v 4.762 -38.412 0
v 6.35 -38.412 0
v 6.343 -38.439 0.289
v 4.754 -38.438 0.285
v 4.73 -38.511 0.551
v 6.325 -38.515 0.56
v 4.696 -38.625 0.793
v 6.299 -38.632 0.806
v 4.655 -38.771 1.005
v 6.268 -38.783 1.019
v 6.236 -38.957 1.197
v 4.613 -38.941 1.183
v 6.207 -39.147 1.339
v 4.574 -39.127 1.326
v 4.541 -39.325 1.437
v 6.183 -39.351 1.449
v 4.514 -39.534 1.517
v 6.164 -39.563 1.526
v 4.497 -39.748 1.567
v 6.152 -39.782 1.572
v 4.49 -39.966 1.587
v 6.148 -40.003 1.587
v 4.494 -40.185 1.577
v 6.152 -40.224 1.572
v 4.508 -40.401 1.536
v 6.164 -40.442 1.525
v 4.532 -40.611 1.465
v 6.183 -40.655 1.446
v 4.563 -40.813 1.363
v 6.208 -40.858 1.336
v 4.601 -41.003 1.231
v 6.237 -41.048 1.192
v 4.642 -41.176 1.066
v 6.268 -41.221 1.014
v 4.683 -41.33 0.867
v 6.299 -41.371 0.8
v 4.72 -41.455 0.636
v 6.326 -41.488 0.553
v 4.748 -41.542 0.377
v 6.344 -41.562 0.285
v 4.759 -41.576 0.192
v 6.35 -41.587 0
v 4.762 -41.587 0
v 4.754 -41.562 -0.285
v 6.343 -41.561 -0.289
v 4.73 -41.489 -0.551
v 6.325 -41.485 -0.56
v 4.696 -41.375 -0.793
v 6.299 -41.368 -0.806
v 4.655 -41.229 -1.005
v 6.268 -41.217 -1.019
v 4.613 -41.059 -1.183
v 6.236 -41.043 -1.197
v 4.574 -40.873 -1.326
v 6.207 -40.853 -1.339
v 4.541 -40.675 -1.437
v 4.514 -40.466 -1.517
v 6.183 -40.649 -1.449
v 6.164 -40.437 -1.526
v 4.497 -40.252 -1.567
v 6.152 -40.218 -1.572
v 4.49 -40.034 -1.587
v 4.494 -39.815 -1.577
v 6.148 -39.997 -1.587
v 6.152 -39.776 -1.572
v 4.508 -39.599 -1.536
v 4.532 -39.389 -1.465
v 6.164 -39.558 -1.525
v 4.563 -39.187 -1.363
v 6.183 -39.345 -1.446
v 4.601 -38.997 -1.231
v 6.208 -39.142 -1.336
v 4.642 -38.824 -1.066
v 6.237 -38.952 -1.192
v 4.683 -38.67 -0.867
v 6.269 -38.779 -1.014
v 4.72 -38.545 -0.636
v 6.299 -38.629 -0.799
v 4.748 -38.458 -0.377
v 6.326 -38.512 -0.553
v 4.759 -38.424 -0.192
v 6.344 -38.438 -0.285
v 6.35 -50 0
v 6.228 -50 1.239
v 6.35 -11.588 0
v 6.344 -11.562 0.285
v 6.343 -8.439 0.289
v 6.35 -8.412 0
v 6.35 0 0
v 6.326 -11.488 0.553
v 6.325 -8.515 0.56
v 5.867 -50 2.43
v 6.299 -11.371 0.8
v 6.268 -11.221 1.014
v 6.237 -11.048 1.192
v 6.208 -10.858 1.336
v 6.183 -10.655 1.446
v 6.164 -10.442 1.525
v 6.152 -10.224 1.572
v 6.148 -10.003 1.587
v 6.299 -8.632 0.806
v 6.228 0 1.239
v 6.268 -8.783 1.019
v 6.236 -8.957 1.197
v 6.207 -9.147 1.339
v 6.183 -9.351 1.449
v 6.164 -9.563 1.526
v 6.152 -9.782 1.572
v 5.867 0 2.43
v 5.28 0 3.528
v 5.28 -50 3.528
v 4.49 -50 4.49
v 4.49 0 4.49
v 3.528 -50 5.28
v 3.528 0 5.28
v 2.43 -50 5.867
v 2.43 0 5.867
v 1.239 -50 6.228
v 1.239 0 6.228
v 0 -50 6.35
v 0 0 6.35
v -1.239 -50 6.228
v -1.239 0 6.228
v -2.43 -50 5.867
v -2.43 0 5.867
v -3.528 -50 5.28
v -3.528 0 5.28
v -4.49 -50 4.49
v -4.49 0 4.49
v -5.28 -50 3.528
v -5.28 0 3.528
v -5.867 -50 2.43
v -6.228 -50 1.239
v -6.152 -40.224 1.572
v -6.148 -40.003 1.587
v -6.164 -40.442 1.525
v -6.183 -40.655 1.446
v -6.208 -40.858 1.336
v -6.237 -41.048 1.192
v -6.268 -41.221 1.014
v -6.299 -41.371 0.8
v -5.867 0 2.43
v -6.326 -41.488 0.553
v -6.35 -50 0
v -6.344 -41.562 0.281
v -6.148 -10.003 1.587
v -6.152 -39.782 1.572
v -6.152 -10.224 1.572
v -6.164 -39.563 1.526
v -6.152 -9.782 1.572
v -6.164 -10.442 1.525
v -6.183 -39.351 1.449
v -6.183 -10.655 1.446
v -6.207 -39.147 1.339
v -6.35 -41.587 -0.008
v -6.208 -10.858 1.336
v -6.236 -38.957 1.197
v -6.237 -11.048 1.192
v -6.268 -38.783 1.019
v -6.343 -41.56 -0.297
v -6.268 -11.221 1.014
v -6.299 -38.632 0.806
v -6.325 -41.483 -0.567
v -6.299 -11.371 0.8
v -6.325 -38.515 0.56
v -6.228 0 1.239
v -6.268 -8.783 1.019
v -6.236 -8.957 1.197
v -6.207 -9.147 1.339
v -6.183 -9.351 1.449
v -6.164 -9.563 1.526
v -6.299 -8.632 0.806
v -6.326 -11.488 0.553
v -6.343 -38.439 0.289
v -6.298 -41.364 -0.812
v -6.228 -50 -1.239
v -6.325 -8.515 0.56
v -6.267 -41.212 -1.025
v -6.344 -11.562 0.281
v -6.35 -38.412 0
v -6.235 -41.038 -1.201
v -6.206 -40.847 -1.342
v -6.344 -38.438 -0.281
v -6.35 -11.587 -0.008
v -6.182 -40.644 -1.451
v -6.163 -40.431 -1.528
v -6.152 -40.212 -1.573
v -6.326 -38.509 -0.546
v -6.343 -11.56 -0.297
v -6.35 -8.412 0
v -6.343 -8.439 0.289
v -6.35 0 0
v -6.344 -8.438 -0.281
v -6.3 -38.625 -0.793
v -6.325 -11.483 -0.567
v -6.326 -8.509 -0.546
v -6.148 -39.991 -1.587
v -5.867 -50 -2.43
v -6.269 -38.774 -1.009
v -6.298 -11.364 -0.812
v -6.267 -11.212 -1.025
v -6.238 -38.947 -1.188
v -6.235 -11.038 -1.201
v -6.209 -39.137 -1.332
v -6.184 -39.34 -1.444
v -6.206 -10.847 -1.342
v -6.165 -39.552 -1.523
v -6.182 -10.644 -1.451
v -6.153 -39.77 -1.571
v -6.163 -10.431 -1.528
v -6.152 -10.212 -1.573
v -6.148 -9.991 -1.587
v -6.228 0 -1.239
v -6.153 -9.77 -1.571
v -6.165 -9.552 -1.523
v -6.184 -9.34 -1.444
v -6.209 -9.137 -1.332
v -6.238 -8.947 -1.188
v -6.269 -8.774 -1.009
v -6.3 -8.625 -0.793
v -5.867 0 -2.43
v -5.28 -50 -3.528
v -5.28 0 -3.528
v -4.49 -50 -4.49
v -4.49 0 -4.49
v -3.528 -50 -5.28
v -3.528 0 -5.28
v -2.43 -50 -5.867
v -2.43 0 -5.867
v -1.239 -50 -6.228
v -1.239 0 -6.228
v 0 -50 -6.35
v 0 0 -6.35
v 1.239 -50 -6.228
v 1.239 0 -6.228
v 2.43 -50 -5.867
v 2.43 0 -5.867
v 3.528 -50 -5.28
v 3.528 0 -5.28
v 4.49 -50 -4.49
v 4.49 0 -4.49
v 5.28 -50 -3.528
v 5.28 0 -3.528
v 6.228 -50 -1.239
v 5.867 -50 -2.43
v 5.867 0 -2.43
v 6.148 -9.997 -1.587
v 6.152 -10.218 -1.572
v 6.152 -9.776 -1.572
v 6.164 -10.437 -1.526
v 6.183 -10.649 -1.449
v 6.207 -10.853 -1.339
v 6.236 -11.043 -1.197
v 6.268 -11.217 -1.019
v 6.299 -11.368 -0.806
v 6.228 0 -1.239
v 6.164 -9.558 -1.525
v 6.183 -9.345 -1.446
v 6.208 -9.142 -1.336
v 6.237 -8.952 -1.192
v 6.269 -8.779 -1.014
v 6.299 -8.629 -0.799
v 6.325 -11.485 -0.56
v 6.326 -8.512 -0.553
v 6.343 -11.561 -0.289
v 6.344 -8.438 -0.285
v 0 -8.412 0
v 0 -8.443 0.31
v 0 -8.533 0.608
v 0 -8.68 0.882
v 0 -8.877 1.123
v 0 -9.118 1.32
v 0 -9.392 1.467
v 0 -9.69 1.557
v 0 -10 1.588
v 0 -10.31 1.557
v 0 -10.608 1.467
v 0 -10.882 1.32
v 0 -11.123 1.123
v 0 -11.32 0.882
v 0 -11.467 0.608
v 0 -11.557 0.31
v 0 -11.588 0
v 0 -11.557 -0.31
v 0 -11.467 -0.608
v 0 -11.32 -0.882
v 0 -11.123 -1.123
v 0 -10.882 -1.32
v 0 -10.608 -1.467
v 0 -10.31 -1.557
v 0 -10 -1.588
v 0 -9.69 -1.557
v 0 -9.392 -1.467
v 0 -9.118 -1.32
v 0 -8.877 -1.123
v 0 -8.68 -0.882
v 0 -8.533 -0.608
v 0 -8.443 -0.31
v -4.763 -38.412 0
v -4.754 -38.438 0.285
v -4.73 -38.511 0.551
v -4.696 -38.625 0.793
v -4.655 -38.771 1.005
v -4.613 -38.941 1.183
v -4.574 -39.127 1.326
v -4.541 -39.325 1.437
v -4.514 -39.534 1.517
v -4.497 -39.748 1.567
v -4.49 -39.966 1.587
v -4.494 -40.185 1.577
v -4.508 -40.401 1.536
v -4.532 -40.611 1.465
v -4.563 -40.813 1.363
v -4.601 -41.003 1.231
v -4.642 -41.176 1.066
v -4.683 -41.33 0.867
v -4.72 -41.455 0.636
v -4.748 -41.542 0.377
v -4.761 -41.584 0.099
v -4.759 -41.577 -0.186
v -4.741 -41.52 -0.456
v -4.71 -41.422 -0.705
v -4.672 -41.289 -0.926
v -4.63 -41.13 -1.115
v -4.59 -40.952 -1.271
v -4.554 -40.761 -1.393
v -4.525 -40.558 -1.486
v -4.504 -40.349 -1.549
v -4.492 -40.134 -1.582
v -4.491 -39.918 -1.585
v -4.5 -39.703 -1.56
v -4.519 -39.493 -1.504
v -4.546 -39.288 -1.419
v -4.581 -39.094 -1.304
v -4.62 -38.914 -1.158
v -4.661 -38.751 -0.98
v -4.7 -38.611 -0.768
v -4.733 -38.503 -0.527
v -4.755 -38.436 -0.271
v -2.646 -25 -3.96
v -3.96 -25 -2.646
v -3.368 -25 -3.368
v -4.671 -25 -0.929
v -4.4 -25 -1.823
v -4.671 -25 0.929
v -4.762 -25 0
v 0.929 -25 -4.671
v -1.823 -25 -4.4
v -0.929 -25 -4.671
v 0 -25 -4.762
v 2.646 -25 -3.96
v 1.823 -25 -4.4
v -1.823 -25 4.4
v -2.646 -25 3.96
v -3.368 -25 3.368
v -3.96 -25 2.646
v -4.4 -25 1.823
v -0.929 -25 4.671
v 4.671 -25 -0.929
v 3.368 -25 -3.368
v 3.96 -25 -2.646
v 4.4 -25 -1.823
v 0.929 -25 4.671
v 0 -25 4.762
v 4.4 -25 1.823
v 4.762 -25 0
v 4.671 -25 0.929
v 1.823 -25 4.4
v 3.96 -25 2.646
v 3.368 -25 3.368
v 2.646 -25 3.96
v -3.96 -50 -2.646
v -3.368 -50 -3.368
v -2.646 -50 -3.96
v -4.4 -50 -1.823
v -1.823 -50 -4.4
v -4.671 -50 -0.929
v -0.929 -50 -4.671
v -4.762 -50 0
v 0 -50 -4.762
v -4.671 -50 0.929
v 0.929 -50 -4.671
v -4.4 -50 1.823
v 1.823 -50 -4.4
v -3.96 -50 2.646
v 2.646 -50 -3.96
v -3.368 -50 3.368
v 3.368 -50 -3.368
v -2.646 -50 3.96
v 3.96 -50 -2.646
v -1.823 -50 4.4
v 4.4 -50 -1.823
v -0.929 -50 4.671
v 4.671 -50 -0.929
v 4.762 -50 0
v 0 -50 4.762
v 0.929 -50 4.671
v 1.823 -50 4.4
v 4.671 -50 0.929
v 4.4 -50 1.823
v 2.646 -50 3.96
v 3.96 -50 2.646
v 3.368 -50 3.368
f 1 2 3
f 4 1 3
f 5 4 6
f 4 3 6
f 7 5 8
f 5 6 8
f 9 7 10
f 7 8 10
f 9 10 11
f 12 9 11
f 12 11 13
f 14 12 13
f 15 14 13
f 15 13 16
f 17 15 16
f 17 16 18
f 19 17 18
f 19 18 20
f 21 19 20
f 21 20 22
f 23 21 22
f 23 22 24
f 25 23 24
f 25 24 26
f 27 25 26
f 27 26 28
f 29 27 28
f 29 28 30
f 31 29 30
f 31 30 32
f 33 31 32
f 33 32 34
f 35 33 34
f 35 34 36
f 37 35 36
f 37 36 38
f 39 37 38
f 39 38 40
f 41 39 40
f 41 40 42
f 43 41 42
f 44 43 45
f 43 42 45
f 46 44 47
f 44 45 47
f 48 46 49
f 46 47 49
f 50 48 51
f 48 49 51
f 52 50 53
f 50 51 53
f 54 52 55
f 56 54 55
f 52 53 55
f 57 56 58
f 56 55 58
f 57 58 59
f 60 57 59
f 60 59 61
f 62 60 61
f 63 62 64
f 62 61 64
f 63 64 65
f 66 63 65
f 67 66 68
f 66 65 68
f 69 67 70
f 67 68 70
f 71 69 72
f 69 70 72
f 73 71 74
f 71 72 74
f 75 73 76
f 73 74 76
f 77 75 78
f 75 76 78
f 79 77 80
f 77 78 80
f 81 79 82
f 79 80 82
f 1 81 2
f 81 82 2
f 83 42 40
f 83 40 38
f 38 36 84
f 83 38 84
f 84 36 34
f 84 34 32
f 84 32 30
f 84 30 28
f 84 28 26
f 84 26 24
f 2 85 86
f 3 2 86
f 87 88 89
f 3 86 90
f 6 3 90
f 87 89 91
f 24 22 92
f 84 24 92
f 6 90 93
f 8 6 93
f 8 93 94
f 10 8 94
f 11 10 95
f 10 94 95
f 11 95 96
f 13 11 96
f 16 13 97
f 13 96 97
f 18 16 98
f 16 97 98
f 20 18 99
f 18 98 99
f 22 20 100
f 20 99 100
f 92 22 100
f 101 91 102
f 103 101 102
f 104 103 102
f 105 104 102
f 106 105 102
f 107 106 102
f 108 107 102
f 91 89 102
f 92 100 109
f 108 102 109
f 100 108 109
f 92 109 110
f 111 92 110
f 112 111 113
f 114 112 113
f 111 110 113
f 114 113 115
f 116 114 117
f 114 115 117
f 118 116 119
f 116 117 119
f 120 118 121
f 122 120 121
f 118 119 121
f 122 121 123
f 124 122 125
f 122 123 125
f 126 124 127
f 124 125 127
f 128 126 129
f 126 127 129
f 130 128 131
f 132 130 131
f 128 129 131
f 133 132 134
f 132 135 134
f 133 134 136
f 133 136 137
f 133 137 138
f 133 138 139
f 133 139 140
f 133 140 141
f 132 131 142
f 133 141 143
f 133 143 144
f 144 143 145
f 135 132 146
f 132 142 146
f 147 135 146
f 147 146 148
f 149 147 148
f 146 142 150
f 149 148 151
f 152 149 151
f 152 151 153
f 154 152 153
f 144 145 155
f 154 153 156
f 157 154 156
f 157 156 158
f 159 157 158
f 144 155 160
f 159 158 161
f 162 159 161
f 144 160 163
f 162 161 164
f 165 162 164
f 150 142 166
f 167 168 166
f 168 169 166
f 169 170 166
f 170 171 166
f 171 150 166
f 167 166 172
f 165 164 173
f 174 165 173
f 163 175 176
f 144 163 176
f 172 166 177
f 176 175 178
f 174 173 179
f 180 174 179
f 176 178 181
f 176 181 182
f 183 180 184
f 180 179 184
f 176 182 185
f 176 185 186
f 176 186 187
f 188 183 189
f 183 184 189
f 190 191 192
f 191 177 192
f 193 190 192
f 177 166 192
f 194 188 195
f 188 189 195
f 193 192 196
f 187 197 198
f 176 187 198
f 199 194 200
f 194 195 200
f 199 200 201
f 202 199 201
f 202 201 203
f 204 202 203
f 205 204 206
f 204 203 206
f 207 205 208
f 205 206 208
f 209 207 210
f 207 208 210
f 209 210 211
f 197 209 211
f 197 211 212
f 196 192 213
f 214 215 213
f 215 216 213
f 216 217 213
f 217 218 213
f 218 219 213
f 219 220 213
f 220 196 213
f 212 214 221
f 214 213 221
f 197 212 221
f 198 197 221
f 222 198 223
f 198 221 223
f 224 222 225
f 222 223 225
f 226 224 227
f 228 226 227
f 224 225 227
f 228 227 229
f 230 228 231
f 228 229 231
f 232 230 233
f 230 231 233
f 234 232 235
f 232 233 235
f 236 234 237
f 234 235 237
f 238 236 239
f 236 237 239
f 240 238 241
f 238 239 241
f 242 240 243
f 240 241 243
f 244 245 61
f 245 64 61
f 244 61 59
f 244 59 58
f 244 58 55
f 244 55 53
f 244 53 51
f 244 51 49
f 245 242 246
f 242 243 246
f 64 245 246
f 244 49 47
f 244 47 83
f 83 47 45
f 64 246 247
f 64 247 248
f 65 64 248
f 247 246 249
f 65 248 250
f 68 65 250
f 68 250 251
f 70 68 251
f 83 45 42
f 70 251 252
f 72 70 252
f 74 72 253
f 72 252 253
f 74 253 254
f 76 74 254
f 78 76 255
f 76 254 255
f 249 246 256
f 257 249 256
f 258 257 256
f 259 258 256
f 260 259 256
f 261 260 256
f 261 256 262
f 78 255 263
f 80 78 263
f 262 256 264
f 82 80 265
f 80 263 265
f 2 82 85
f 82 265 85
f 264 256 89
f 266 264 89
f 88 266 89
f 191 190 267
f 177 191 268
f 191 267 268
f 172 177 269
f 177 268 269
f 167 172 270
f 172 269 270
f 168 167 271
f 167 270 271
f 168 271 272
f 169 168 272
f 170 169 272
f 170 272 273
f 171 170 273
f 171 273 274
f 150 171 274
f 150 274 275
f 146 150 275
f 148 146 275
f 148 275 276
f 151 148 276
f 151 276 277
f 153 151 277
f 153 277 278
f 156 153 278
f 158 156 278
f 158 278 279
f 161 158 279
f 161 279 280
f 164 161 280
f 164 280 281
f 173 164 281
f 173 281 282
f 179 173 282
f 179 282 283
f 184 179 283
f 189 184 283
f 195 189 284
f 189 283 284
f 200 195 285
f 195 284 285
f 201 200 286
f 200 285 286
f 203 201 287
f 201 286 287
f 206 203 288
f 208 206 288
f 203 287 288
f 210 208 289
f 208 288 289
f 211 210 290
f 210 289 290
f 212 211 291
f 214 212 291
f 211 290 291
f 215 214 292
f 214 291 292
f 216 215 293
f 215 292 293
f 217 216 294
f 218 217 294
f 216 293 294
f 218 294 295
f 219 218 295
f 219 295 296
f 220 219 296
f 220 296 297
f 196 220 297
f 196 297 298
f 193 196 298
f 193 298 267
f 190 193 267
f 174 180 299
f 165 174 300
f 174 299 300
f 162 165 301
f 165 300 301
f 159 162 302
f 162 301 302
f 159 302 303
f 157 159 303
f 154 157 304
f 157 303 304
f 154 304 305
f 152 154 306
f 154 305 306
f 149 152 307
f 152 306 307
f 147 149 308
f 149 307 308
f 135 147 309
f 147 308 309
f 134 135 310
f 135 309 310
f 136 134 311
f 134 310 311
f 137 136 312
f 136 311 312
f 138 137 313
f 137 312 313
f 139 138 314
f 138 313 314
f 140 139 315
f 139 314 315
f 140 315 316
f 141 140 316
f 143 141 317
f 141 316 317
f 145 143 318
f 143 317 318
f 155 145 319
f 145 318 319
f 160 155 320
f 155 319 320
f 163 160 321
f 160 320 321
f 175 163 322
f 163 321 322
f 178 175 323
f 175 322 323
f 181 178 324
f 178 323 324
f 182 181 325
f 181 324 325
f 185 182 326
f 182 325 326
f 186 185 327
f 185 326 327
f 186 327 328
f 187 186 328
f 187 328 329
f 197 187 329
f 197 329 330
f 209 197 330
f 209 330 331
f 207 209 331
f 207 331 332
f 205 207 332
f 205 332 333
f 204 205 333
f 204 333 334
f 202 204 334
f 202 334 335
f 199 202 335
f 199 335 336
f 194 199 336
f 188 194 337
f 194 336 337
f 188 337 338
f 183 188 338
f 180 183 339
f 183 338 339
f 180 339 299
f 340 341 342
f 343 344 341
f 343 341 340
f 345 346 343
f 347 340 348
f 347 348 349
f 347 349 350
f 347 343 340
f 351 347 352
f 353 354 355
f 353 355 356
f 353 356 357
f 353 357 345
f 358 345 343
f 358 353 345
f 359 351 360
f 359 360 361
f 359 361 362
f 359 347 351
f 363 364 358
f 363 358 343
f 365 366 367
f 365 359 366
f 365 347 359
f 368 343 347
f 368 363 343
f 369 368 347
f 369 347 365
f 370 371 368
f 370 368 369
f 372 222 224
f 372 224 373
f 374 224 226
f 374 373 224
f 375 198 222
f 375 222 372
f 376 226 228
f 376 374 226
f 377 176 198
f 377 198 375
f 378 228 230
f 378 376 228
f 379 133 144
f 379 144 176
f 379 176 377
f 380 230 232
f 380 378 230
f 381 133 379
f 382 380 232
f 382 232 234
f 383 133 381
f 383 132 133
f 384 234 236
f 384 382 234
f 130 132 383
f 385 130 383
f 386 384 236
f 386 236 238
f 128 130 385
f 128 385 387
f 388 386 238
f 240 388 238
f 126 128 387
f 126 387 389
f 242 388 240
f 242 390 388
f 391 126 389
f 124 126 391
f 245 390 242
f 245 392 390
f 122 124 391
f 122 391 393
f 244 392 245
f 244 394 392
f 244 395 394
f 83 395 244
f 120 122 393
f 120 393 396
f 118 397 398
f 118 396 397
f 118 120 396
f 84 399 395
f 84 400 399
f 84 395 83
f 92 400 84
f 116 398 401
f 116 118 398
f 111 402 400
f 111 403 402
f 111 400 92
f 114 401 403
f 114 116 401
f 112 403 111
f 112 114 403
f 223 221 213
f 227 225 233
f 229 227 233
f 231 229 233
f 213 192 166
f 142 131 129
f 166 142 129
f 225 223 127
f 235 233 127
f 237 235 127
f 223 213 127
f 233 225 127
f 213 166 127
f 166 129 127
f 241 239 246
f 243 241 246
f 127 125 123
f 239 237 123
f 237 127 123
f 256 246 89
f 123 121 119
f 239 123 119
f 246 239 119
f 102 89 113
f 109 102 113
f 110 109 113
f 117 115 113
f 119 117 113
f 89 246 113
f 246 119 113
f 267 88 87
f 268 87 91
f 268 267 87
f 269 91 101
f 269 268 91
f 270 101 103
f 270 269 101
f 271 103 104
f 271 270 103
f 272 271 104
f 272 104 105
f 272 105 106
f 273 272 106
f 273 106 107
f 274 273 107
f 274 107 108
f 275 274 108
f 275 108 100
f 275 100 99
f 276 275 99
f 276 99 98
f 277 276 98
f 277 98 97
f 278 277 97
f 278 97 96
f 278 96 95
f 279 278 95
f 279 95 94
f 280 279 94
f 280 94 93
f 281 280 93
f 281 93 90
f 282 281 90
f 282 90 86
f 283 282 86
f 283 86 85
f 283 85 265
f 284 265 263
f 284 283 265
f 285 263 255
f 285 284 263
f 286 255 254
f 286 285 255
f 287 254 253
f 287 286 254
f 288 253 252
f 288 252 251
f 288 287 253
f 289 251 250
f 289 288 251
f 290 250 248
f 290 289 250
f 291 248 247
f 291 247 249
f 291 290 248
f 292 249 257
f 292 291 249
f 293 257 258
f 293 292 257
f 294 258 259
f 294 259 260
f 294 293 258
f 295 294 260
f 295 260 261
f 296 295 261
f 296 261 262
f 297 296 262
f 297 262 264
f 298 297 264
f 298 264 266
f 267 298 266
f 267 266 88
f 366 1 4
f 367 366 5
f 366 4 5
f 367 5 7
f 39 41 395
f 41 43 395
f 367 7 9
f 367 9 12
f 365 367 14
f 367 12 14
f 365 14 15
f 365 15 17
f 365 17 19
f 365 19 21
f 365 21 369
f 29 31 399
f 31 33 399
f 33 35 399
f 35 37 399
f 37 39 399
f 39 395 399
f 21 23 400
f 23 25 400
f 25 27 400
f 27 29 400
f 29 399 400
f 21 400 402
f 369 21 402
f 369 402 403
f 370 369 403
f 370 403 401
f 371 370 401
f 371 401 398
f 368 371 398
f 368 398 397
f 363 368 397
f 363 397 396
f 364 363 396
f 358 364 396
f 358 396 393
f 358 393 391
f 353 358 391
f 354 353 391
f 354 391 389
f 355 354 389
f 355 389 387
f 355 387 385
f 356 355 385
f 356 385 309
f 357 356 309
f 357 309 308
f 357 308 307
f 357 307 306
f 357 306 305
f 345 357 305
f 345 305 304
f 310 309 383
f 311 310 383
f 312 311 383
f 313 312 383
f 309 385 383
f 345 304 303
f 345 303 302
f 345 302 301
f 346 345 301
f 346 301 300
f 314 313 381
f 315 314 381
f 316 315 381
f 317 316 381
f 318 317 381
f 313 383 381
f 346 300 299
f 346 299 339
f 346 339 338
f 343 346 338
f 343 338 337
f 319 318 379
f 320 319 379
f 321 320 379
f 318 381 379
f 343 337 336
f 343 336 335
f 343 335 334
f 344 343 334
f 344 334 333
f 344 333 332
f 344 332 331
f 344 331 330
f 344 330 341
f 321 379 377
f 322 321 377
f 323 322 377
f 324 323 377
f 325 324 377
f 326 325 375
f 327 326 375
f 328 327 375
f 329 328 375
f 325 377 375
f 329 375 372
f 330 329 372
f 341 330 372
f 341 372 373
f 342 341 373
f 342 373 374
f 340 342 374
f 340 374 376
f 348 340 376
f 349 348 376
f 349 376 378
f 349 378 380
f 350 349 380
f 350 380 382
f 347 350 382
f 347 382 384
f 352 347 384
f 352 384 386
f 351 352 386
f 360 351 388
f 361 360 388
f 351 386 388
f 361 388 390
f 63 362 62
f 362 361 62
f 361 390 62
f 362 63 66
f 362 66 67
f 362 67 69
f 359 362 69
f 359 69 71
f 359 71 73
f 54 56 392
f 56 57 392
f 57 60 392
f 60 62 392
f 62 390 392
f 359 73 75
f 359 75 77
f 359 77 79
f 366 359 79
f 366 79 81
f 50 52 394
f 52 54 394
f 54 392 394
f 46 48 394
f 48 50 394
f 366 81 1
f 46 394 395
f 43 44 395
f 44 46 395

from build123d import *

# Parameters (mm, degrees)
F0_R     = 6.35
F1_DEPTH = 50
F2_R     = 1.5875
F3_DEPTH = 12.5
F4_R     = 4.7625
F5_DEPTH = 25


with BuildPart() as f1:
    # F0 (on Front) → F1 (new body)
    with BuildSketch(Plane.XZ):
        Circle(F0_R)
    extrude(amount=F1_DEPTH)

    # F2 (on Right) → F3 (cut, symmetric)
    with BuildSketch(Plane.YZ):
        with Locations((-10, 0)):
            Circle(F2_R)
        with Locations((-40, 0)):
            Circle(F2_R)
    extrude(amount=F3_DEPTH, both=True, mode=Mode.SUBTRACT)

    # F4 (on face) → F5 (cut)
    with BuildSketch(Plane.XZ.offset(50)):
        Circle(F4_R)
    extrude(amount=-F5_DEPTH, mode=Mode.SUBTRACT)


solid = f1.part
